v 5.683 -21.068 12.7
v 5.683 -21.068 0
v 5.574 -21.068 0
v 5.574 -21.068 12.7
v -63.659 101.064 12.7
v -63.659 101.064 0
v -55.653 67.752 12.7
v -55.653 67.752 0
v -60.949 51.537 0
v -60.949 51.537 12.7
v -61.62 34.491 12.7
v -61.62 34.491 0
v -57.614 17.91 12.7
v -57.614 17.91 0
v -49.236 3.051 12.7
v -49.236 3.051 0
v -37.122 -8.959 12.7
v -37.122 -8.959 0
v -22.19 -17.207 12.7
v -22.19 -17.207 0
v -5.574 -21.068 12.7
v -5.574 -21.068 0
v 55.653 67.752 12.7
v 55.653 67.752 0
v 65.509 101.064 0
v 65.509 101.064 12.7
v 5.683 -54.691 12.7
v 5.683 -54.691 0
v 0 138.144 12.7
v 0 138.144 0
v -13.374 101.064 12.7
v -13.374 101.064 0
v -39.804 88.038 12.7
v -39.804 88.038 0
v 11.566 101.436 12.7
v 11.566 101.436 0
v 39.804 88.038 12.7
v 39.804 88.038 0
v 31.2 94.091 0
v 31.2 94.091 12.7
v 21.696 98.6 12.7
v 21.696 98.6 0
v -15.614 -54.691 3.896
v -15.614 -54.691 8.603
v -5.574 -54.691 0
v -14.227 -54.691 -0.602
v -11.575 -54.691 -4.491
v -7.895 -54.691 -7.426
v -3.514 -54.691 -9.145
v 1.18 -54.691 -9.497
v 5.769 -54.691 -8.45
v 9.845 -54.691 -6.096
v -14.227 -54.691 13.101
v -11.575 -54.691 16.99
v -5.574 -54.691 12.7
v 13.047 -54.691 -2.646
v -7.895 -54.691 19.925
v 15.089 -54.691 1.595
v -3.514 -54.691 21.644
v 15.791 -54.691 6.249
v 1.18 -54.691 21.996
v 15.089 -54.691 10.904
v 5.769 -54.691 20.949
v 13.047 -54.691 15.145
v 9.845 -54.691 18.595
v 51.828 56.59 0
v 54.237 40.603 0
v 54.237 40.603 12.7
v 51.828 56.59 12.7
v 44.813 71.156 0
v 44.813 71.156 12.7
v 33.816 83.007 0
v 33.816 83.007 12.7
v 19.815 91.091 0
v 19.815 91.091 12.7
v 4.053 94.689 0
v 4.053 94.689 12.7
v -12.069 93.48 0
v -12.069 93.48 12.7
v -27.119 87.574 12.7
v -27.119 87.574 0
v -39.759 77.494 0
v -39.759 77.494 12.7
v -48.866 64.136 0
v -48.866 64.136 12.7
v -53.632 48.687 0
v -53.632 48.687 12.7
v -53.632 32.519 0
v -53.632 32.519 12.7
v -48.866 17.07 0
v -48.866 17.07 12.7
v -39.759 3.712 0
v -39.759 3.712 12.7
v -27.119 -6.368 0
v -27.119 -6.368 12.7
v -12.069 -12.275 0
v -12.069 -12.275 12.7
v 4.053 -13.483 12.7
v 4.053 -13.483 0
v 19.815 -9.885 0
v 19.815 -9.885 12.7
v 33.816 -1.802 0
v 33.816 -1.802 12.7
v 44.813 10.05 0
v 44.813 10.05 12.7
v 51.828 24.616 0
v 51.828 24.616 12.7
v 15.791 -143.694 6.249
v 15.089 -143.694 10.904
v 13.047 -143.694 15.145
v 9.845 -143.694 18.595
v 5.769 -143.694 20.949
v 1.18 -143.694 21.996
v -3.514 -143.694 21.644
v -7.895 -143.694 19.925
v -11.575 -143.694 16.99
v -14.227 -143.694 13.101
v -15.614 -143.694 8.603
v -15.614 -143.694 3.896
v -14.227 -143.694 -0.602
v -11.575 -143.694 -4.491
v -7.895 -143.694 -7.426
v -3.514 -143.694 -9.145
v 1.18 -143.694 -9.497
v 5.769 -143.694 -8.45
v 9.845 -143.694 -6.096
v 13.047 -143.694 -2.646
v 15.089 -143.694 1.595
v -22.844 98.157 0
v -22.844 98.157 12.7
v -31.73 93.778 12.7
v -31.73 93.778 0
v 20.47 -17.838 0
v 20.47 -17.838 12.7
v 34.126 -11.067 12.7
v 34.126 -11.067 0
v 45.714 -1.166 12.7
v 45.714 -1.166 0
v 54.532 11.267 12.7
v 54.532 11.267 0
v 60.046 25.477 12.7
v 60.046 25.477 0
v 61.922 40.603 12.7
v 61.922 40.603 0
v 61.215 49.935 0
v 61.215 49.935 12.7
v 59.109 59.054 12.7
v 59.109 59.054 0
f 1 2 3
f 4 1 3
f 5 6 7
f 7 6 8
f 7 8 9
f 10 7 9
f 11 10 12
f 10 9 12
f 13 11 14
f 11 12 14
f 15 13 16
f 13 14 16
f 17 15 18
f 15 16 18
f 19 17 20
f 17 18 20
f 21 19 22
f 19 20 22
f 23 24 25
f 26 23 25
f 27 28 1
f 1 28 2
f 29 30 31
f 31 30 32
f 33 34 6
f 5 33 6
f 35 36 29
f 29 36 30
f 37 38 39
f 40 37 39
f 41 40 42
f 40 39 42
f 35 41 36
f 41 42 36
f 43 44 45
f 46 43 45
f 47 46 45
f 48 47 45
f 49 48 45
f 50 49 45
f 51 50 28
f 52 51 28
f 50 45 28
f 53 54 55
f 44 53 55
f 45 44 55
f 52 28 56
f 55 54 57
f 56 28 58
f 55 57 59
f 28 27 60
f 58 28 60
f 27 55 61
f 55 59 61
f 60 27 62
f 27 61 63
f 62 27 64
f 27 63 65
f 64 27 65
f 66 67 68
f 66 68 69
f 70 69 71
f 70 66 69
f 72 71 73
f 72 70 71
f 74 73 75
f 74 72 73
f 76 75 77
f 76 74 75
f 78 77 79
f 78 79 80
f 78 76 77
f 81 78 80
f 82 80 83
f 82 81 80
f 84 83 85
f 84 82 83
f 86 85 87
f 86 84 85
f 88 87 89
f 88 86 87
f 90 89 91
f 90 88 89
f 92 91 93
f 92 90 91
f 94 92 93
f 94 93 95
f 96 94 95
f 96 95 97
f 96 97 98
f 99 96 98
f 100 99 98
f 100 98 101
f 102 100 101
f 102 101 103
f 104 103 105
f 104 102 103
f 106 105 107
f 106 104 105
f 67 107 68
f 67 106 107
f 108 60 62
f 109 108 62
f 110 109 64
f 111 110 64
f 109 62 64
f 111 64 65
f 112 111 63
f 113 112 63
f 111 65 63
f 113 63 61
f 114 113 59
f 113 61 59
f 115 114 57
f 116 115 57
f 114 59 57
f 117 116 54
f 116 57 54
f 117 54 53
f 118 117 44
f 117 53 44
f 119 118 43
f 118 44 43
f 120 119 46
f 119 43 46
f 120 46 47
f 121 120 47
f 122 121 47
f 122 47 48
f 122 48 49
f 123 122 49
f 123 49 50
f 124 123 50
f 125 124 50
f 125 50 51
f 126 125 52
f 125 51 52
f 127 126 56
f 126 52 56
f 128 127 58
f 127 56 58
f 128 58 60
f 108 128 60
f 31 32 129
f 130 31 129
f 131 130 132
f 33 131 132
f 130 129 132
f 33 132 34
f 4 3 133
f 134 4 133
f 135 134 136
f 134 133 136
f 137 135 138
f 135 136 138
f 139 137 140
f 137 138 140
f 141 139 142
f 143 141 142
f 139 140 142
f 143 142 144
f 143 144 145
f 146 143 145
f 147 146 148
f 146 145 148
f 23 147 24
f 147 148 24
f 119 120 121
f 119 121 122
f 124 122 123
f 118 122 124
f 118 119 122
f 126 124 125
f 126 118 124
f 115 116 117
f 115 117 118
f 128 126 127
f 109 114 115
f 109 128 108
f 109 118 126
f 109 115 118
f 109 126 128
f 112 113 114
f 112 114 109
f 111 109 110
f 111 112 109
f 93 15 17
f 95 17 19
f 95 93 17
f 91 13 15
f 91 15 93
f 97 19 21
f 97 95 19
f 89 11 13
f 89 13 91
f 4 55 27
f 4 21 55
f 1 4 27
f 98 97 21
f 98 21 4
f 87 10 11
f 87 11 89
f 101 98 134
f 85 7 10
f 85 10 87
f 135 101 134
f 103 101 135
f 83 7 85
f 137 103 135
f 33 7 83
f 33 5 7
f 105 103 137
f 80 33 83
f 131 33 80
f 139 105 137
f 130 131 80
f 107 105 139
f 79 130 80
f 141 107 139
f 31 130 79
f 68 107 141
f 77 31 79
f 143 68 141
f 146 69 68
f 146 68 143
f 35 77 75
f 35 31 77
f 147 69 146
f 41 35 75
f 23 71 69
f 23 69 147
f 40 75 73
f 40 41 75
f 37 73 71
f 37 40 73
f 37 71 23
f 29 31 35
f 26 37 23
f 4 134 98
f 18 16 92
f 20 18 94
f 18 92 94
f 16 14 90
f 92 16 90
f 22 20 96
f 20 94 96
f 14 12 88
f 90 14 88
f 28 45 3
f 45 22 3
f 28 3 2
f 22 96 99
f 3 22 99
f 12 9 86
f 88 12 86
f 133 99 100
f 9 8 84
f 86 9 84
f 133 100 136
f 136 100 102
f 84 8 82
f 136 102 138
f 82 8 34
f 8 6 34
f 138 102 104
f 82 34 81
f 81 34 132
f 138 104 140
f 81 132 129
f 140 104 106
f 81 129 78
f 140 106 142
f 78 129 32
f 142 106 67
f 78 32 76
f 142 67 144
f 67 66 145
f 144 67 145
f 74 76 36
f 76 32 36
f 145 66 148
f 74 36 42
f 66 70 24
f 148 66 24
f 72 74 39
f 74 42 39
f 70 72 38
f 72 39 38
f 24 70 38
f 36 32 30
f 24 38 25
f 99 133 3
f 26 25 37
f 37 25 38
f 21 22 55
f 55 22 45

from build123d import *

# Parameters (mm, degrees)
F0_R     = 54.2373260285
F1_DEPTH = 12.7
F3_START = 54.6908248216
F2_R     = 15.7906260278
F3_DEPTH = 89.0027470887


with BuildPart() as f1:
    # F0 (on Top) → F1 (new body)
    with BuildSketch(Plane.XY):
        with BuildLine():
            ThreePointArc((5.5742384489, -21.0680376267), (45.7140278431, -1.1655540145), (61.9223292112, 40.6028851867))
            ThreePointArc((61.9223292112, 40.6028851867), (60.33472157, 54.5347274197), (55.653307019, 67.7521811772))
            ThreePointArc((55.653307019, 67.7521811772), (48.7942433887, 78.7276365572), (39.8035687607, 88.0375852368))
            ThreePointArc((39.8035687607, 88.0375852368), (26.5437780286, 96.5475248129), (11.5655175366, 101.4355545268))
            ThreePointArc((11.5655175366, 101.4355545268), (-0.9231515567, 102.5183327433), (-13.3739883144, 101.0637096229))
            ThreePointArc((-13.3739883144, 101.0637096229), (-27.3748629814, 96.1455870627), (-39.8035687607, 88.0375852368))
            ThreePointArc((-39.8035687607, 88.0375852368), (-48.7942433887, 78.7276365572), (-55.653307019, 67.7521811772))
            ThreePointArc((-55.653307019, 67.7521811772), (-53.9394187779, 10.190487109), (-5.5742384489, -21.0680376267))
            Line((-5.5742384489, -21.0680376267), (5.5742384489, -21.0680376267))
        make_face()
        with Locations((0, 40.6028851867)):
            Circle(F0_R, mode=Mode.SUBTRACT)
        with BuildLine():
            ThreePointArc((-13.3739883144, 101.0637096229), (-0.9231515567, 102.5183327433), (11.5655175366, 101.4355545268))
            Line((11.5655175366, 101.4355545268), (0, 138.1439715624))
            Line((0, 138.1439715624), (-13.3739883144, 101.0637096229))
        make_face()
        with BuildLine():
            ThreePointArc((39.8035687607, 88.0375852368), (48.7942433887, 78.7276365572), (55.653307019, 67.7521811772))
            Line((55.653307019, 67.7521811772), (65.5085667968, 101.0637096229))
            Line((65.5085667968, 101.0637096229), (39.8035687607, 88.0375852368))
        make_face()
        with BuildLine():
            Line((5.6826770306, -21.0680376267), (5.5742384489, -21.0680376267))
            ThreePointArc((5.5742384489, -21.0680376267), (0, -21.3194440245), (-5.5742384489, -21.0680376267))
            Line((-5.5742384489, -21.0680376267), (-5.5742384489, -58.2595206797))
            Line((-5.5742384489, -58.2595206797), (5.6826770306, -58.2595206797))
            Line((5.6826770306, -58.2595206797), (5.6826770306, -21.0680376267))
        make_face()
        with BuildLine():
            ThreePointArc((-5.5742384489, -21.0680376267), (0, -21.3194440245), (5.5742384489, -21.0680376267))
            Line((5.5742384489, -21.0680376267), (-5.5742384489, -21.0680376267))
        make_face()
        with BuildLine():
            Line((-63.6594295502, 101.0637096229), (-55.653307019, 67.7521811772))
            ThreePointArc((-55.653307019, 67.7521811772), (-48.7942433887, 78.7276365572), (-39.8035687607, 88.0375852368))
            Line((-39.8035687607, 88.0375852368), (-63.6594295502, 101.0637096229))
        make_face()
        Polygon((5.6826770306, -58.2595206797), (-5.5742384489, -58.2595206797), (-13.3375748992, -58.2595206797), (-13.3375748992, -143.073156476), (13.1347030401, -143.073156476), (13.1347030401, -58.2595206797), align=None)
    extrude(amount=F1_DEPTH)

    # F2 (on Front) → F3 (join)
    with BuildSketch(Plane.XZ.offset(F3_START)):
        with Locations((0, 6.2494464219)):
            Circle(F2_R)
    extrude(amount=F3_DEPTH)


solid = f1.part
